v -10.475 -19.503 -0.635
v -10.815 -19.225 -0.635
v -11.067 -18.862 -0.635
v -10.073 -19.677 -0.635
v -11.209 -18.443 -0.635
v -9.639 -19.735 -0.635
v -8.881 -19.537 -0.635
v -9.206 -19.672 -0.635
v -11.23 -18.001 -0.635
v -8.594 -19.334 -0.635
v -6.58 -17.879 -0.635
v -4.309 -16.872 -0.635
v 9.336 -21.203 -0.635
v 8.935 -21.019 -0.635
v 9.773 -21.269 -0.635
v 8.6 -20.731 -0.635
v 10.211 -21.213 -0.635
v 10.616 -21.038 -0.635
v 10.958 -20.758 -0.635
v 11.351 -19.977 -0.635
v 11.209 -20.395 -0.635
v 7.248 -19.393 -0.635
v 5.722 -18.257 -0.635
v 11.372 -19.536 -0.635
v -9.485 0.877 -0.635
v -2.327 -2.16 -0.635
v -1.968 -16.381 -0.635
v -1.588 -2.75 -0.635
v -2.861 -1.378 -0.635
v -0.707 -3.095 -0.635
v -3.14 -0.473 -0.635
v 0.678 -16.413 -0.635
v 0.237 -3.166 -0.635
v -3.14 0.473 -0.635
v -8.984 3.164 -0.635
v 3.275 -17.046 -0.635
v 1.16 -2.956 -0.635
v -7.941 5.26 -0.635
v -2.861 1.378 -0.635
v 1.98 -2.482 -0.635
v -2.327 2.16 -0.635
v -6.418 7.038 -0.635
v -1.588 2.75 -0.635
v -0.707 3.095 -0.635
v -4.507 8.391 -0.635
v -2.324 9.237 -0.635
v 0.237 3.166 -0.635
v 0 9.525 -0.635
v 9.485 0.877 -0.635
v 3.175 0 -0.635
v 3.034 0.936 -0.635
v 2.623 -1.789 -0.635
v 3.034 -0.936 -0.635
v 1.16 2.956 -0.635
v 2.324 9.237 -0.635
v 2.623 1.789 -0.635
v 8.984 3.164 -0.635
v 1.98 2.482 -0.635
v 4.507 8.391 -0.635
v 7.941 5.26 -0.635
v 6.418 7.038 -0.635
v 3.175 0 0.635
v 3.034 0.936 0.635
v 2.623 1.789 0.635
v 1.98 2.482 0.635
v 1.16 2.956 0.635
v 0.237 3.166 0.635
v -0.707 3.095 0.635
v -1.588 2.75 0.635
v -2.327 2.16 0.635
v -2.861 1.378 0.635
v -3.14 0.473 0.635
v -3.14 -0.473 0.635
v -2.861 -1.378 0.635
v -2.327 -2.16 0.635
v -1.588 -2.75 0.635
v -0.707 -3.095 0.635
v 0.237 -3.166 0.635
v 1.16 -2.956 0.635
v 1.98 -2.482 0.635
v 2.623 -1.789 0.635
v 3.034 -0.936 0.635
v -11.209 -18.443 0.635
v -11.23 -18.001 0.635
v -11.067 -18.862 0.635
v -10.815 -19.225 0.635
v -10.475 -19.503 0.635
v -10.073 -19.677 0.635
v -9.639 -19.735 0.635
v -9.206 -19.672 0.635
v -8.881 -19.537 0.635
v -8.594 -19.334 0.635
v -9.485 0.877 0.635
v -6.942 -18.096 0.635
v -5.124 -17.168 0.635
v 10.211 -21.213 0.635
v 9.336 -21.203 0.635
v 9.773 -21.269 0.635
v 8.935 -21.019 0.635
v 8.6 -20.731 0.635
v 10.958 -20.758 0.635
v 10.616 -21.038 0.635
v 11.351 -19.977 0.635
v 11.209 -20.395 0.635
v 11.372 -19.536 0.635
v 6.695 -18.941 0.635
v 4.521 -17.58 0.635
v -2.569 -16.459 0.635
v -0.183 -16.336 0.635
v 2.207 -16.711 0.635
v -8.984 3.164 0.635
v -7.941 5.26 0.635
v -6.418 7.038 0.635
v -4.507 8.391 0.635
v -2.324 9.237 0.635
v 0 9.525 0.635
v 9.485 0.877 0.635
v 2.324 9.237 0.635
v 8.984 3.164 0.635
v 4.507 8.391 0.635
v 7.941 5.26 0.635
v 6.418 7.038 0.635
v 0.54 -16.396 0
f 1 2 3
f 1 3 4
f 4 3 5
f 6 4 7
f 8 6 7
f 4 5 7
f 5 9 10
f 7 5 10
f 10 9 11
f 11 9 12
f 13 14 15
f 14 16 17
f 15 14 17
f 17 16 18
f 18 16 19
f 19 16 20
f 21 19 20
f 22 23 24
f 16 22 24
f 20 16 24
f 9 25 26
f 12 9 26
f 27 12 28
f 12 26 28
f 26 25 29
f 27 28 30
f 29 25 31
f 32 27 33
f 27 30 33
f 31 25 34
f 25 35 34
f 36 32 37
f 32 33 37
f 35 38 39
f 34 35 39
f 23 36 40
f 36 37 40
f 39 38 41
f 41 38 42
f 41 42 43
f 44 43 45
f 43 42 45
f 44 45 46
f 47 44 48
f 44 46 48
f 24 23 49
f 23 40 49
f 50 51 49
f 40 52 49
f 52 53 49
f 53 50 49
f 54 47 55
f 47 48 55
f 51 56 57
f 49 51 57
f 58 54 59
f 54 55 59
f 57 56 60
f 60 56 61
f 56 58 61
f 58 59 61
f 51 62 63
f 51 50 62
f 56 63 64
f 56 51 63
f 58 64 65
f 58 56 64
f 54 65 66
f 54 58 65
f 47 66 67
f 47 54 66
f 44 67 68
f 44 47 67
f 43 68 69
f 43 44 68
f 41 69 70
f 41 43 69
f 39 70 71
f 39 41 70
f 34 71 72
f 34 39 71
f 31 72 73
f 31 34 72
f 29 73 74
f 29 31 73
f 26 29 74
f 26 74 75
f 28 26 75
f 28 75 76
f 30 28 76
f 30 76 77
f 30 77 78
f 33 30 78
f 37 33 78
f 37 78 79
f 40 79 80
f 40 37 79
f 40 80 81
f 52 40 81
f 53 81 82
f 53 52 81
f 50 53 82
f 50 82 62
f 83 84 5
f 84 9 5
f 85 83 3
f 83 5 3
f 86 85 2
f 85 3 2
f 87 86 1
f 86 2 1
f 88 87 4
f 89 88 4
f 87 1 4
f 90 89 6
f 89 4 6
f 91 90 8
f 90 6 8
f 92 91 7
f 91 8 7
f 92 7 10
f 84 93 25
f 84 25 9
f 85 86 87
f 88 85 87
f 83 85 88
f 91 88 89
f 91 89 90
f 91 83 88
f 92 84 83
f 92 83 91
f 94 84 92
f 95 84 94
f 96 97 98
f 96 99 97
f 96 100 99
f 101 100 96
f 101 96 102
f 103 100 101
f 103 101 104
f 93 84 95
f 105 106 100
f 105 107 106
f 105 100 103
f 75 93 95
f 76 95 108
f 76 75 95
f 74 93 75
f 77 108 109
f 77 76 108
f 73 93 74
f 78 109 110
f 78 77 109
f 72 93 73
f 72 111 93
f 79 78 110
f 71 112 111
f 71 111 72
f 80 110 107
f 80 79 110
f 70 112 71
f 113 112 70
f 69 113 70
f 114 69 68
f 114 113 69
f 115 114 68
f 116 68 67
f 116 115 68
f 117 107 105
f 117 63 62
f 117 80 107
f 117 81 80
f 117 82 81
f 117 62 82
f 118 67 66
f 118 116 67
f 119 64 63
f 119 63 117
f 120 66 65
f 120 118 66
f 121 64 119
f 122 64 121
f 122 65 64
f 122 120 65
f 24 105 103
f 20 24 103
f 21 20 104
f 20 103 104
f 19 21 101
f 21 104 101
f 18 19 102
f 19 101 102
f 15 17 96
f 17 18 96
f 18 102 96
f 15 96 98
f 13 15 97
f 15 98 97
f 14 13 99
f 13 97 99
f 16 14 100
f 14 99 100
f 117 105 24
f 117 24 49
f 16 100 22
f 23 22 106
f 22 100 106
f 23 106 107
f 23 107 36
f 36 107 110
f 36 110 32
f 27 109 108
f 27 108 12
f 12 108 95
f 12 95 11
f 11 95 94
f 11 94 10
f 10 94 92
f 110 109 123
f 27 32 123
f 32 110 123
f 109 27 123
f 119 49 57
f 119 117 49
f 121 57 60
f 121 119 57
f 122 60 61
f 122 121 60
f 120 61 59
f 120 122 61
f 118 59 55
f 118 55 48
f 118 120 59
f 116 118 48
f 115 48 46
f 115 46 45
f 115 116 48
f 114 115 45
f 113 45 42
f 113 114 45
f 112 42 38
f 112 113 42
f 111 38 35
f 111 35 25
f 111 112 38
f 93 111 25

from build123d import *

# Parameters (mm, degrees)
SKETCH1_R           = 3.175
BOSS_EXTRUDE1_DEPTH = 0.635
SKETCH2_R           = 12.7
CUT_EXTRUDE4_DEPTH  = 212.524238452
CUT_EXTRUDE5_DEPTH  = 37.22284017
FILLET1_R           = 1.5875


with BuildPart() as part:
    # Sketch1 → Boss-Extrude1 (new, symmetric)
    with BuildSketch(Plane.XY):
        with BuildLine():
            Line((-9.484545184, 0.876942223), (-12.7, -33.89972345))
            Line((-12.7, -33.89972345), (12.7, -33.89972345))
            Line((12.7, -33.89972345), (9.484545184, 0.876942223))
            ThreePointArc((9.484545184, 0.876942223), (0, 9.525), (-9.484545184, 0.876942223))
        make_face()
        Circle(SKETCH1_R, mode=Mode.SUBTRACT)
    extrude(amount=BOSS_EXTRUDE1_DEPTH, both=True)

    # Sketch2 → Cut-Extrude4 (cut, through all)
    with BuildSketch(Plane(origin=(11.360273025, -110.358999973, -171.966950351), x_dir=(0.9980881037002614, 0.025903655155534222, 0.05611718009308436), z_dir=(-0.06180716474340577, 0.4198866087842844, 0.9054695523042258))):
        Circle(SKETCH2_R)
    extrude(amount=CUT_EXTRUDE4_DEPTH, mode=Mode.SUBTRACT)


with BuildPart() as cut_extrude4_kept_piece:
    # of the separate pieces the step leaves, the one the design keeps (cut_extrude4_pieces_kept)
    add(part.part.solids().sort_by_distance((-9.484545184, 0.876942223, 0.635))[0])

    # Sketch3 → Cut-Extrude5 (cut, through all)
    with BuildSketch(Plane.XY.offset(0.635)):
        with BuildLine():
            Line((-11.744890387, -23.569760946), (-12.986106665, -32.169096948))
            Line((-12.986106665, -32.169096948), (12.819749994, -35.194876316))
            Line((12.819749994, -35.194876316), (11.371919396, -19.535903157))
            ThreePointArc((11.371919396, -19.535903157), (10.419687683, -21.139836428), (8.599708374, -20.731152577))
            add(Edge.make_bspline(
                [(8.599708374, -20.731152577), (-3.74867157, -6.707106034), (-11.744890387, -23.569760946)],
                knots=[2.192806487, 2.192806487, 2.192806487, 4.076762859, 4.076762859, 4.076762859], degree=2, weights=[1, 0.588189372, 1]))
        make_face()
    extrude(amount=-CUT_EXTRUDE5_DEPTH, mode=Mode.SUBTRACT)

    # Fillet1
    fillet1_edges = [cut_extrude4_kept_piece.edges().sort_by_distance(p)[0] for p in [
        (-11.744890387, -23.569760946, 0),
    ]]
    fillet(fillet1_edges, radius=FILLET1_R)


solid = cut_extrude4_kept_piece.part
